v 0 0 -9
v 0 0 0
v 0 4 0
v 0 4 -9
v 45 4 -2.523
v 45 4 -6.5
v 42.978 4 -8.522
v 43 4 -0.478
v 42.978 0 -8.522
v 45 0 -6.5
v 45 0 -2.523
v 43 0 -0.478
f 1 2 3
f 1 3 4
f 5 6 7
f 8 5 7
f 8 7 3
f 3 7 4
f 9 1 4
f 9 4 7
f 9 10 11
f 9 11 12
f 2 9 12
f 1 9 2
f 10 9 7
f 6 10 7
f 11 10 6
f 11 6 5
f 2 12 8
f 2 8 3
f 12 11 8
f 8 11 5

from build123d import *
from OCP.BRepFilletAPI import BRepFilletAPI_MakeChamfer

# Parameters (mm, degrees)
BOSS_EXTRUDE1_DEPTH = 4
CHAMFER2_SIZE       = 2
CHAMFER2_SIZE2      = 2.02259675


with BuildPart() as part:
    # Sketch2 → Boss-Extrude1 (new body)
    with BuildSketch(Plane(origin=(0, 0, 0), x_dir=(1, 0, 0), z_dir=(0, 1, 0))):
        Polygon((0, 9), (45, 8.5), (45, 0.5), (0, 0), align=None)
    extrude(amount=BOSS_EXTRUDE1_DEPTH)

    # Chamfer2: one chamfer whose edges measure the first distance from different faces: ONE call of the kernel's chamfer builder (chamfer() names one face for all edges)
    chamfer2_edges_1 = [part.edges().sort_by_distance(p)[0] for p in [
        (45, 2, -8.5),
    ]]
    chamfer2_side_1 = [part.faces().sort_by_distance(p)[0] for p in [
        (45, 2, -4.5),
    ]]
    chamfer2_edges_2 = [part.edges().sort_by_distance(p)[0] for p in [
        (45, 2, -0.5),
    ]]
    chamfer2_side_2 = [part.faces().sort_by_distance(p)[0] for p in [
        (22.5, 2, -0.25),
    ]]
    chamfer2 = BRepFilletAPI_MakeChamfer(part.part.solid().wrapped)
    for e in chamfer2_edges_1:
        chamfer2.Add(CHAMFER2_SIZE, CHAMFER2_SIZE2, e.wrapped, chamfer2_side_1[0].wrapped)  # the first distance lies on this face
    for e in chamfer2_edges_2:
        chamfer2.Add(CHAMFER2_SIZE, CHAMFER2_SIZE2, e.wrapped, chamfer2_side_2[0].wrapped)  # the first distance lies on this face
    add(Compound.cast(chamfer2.Shape()), mode=Mode.REPLACE)


solid = part.part
